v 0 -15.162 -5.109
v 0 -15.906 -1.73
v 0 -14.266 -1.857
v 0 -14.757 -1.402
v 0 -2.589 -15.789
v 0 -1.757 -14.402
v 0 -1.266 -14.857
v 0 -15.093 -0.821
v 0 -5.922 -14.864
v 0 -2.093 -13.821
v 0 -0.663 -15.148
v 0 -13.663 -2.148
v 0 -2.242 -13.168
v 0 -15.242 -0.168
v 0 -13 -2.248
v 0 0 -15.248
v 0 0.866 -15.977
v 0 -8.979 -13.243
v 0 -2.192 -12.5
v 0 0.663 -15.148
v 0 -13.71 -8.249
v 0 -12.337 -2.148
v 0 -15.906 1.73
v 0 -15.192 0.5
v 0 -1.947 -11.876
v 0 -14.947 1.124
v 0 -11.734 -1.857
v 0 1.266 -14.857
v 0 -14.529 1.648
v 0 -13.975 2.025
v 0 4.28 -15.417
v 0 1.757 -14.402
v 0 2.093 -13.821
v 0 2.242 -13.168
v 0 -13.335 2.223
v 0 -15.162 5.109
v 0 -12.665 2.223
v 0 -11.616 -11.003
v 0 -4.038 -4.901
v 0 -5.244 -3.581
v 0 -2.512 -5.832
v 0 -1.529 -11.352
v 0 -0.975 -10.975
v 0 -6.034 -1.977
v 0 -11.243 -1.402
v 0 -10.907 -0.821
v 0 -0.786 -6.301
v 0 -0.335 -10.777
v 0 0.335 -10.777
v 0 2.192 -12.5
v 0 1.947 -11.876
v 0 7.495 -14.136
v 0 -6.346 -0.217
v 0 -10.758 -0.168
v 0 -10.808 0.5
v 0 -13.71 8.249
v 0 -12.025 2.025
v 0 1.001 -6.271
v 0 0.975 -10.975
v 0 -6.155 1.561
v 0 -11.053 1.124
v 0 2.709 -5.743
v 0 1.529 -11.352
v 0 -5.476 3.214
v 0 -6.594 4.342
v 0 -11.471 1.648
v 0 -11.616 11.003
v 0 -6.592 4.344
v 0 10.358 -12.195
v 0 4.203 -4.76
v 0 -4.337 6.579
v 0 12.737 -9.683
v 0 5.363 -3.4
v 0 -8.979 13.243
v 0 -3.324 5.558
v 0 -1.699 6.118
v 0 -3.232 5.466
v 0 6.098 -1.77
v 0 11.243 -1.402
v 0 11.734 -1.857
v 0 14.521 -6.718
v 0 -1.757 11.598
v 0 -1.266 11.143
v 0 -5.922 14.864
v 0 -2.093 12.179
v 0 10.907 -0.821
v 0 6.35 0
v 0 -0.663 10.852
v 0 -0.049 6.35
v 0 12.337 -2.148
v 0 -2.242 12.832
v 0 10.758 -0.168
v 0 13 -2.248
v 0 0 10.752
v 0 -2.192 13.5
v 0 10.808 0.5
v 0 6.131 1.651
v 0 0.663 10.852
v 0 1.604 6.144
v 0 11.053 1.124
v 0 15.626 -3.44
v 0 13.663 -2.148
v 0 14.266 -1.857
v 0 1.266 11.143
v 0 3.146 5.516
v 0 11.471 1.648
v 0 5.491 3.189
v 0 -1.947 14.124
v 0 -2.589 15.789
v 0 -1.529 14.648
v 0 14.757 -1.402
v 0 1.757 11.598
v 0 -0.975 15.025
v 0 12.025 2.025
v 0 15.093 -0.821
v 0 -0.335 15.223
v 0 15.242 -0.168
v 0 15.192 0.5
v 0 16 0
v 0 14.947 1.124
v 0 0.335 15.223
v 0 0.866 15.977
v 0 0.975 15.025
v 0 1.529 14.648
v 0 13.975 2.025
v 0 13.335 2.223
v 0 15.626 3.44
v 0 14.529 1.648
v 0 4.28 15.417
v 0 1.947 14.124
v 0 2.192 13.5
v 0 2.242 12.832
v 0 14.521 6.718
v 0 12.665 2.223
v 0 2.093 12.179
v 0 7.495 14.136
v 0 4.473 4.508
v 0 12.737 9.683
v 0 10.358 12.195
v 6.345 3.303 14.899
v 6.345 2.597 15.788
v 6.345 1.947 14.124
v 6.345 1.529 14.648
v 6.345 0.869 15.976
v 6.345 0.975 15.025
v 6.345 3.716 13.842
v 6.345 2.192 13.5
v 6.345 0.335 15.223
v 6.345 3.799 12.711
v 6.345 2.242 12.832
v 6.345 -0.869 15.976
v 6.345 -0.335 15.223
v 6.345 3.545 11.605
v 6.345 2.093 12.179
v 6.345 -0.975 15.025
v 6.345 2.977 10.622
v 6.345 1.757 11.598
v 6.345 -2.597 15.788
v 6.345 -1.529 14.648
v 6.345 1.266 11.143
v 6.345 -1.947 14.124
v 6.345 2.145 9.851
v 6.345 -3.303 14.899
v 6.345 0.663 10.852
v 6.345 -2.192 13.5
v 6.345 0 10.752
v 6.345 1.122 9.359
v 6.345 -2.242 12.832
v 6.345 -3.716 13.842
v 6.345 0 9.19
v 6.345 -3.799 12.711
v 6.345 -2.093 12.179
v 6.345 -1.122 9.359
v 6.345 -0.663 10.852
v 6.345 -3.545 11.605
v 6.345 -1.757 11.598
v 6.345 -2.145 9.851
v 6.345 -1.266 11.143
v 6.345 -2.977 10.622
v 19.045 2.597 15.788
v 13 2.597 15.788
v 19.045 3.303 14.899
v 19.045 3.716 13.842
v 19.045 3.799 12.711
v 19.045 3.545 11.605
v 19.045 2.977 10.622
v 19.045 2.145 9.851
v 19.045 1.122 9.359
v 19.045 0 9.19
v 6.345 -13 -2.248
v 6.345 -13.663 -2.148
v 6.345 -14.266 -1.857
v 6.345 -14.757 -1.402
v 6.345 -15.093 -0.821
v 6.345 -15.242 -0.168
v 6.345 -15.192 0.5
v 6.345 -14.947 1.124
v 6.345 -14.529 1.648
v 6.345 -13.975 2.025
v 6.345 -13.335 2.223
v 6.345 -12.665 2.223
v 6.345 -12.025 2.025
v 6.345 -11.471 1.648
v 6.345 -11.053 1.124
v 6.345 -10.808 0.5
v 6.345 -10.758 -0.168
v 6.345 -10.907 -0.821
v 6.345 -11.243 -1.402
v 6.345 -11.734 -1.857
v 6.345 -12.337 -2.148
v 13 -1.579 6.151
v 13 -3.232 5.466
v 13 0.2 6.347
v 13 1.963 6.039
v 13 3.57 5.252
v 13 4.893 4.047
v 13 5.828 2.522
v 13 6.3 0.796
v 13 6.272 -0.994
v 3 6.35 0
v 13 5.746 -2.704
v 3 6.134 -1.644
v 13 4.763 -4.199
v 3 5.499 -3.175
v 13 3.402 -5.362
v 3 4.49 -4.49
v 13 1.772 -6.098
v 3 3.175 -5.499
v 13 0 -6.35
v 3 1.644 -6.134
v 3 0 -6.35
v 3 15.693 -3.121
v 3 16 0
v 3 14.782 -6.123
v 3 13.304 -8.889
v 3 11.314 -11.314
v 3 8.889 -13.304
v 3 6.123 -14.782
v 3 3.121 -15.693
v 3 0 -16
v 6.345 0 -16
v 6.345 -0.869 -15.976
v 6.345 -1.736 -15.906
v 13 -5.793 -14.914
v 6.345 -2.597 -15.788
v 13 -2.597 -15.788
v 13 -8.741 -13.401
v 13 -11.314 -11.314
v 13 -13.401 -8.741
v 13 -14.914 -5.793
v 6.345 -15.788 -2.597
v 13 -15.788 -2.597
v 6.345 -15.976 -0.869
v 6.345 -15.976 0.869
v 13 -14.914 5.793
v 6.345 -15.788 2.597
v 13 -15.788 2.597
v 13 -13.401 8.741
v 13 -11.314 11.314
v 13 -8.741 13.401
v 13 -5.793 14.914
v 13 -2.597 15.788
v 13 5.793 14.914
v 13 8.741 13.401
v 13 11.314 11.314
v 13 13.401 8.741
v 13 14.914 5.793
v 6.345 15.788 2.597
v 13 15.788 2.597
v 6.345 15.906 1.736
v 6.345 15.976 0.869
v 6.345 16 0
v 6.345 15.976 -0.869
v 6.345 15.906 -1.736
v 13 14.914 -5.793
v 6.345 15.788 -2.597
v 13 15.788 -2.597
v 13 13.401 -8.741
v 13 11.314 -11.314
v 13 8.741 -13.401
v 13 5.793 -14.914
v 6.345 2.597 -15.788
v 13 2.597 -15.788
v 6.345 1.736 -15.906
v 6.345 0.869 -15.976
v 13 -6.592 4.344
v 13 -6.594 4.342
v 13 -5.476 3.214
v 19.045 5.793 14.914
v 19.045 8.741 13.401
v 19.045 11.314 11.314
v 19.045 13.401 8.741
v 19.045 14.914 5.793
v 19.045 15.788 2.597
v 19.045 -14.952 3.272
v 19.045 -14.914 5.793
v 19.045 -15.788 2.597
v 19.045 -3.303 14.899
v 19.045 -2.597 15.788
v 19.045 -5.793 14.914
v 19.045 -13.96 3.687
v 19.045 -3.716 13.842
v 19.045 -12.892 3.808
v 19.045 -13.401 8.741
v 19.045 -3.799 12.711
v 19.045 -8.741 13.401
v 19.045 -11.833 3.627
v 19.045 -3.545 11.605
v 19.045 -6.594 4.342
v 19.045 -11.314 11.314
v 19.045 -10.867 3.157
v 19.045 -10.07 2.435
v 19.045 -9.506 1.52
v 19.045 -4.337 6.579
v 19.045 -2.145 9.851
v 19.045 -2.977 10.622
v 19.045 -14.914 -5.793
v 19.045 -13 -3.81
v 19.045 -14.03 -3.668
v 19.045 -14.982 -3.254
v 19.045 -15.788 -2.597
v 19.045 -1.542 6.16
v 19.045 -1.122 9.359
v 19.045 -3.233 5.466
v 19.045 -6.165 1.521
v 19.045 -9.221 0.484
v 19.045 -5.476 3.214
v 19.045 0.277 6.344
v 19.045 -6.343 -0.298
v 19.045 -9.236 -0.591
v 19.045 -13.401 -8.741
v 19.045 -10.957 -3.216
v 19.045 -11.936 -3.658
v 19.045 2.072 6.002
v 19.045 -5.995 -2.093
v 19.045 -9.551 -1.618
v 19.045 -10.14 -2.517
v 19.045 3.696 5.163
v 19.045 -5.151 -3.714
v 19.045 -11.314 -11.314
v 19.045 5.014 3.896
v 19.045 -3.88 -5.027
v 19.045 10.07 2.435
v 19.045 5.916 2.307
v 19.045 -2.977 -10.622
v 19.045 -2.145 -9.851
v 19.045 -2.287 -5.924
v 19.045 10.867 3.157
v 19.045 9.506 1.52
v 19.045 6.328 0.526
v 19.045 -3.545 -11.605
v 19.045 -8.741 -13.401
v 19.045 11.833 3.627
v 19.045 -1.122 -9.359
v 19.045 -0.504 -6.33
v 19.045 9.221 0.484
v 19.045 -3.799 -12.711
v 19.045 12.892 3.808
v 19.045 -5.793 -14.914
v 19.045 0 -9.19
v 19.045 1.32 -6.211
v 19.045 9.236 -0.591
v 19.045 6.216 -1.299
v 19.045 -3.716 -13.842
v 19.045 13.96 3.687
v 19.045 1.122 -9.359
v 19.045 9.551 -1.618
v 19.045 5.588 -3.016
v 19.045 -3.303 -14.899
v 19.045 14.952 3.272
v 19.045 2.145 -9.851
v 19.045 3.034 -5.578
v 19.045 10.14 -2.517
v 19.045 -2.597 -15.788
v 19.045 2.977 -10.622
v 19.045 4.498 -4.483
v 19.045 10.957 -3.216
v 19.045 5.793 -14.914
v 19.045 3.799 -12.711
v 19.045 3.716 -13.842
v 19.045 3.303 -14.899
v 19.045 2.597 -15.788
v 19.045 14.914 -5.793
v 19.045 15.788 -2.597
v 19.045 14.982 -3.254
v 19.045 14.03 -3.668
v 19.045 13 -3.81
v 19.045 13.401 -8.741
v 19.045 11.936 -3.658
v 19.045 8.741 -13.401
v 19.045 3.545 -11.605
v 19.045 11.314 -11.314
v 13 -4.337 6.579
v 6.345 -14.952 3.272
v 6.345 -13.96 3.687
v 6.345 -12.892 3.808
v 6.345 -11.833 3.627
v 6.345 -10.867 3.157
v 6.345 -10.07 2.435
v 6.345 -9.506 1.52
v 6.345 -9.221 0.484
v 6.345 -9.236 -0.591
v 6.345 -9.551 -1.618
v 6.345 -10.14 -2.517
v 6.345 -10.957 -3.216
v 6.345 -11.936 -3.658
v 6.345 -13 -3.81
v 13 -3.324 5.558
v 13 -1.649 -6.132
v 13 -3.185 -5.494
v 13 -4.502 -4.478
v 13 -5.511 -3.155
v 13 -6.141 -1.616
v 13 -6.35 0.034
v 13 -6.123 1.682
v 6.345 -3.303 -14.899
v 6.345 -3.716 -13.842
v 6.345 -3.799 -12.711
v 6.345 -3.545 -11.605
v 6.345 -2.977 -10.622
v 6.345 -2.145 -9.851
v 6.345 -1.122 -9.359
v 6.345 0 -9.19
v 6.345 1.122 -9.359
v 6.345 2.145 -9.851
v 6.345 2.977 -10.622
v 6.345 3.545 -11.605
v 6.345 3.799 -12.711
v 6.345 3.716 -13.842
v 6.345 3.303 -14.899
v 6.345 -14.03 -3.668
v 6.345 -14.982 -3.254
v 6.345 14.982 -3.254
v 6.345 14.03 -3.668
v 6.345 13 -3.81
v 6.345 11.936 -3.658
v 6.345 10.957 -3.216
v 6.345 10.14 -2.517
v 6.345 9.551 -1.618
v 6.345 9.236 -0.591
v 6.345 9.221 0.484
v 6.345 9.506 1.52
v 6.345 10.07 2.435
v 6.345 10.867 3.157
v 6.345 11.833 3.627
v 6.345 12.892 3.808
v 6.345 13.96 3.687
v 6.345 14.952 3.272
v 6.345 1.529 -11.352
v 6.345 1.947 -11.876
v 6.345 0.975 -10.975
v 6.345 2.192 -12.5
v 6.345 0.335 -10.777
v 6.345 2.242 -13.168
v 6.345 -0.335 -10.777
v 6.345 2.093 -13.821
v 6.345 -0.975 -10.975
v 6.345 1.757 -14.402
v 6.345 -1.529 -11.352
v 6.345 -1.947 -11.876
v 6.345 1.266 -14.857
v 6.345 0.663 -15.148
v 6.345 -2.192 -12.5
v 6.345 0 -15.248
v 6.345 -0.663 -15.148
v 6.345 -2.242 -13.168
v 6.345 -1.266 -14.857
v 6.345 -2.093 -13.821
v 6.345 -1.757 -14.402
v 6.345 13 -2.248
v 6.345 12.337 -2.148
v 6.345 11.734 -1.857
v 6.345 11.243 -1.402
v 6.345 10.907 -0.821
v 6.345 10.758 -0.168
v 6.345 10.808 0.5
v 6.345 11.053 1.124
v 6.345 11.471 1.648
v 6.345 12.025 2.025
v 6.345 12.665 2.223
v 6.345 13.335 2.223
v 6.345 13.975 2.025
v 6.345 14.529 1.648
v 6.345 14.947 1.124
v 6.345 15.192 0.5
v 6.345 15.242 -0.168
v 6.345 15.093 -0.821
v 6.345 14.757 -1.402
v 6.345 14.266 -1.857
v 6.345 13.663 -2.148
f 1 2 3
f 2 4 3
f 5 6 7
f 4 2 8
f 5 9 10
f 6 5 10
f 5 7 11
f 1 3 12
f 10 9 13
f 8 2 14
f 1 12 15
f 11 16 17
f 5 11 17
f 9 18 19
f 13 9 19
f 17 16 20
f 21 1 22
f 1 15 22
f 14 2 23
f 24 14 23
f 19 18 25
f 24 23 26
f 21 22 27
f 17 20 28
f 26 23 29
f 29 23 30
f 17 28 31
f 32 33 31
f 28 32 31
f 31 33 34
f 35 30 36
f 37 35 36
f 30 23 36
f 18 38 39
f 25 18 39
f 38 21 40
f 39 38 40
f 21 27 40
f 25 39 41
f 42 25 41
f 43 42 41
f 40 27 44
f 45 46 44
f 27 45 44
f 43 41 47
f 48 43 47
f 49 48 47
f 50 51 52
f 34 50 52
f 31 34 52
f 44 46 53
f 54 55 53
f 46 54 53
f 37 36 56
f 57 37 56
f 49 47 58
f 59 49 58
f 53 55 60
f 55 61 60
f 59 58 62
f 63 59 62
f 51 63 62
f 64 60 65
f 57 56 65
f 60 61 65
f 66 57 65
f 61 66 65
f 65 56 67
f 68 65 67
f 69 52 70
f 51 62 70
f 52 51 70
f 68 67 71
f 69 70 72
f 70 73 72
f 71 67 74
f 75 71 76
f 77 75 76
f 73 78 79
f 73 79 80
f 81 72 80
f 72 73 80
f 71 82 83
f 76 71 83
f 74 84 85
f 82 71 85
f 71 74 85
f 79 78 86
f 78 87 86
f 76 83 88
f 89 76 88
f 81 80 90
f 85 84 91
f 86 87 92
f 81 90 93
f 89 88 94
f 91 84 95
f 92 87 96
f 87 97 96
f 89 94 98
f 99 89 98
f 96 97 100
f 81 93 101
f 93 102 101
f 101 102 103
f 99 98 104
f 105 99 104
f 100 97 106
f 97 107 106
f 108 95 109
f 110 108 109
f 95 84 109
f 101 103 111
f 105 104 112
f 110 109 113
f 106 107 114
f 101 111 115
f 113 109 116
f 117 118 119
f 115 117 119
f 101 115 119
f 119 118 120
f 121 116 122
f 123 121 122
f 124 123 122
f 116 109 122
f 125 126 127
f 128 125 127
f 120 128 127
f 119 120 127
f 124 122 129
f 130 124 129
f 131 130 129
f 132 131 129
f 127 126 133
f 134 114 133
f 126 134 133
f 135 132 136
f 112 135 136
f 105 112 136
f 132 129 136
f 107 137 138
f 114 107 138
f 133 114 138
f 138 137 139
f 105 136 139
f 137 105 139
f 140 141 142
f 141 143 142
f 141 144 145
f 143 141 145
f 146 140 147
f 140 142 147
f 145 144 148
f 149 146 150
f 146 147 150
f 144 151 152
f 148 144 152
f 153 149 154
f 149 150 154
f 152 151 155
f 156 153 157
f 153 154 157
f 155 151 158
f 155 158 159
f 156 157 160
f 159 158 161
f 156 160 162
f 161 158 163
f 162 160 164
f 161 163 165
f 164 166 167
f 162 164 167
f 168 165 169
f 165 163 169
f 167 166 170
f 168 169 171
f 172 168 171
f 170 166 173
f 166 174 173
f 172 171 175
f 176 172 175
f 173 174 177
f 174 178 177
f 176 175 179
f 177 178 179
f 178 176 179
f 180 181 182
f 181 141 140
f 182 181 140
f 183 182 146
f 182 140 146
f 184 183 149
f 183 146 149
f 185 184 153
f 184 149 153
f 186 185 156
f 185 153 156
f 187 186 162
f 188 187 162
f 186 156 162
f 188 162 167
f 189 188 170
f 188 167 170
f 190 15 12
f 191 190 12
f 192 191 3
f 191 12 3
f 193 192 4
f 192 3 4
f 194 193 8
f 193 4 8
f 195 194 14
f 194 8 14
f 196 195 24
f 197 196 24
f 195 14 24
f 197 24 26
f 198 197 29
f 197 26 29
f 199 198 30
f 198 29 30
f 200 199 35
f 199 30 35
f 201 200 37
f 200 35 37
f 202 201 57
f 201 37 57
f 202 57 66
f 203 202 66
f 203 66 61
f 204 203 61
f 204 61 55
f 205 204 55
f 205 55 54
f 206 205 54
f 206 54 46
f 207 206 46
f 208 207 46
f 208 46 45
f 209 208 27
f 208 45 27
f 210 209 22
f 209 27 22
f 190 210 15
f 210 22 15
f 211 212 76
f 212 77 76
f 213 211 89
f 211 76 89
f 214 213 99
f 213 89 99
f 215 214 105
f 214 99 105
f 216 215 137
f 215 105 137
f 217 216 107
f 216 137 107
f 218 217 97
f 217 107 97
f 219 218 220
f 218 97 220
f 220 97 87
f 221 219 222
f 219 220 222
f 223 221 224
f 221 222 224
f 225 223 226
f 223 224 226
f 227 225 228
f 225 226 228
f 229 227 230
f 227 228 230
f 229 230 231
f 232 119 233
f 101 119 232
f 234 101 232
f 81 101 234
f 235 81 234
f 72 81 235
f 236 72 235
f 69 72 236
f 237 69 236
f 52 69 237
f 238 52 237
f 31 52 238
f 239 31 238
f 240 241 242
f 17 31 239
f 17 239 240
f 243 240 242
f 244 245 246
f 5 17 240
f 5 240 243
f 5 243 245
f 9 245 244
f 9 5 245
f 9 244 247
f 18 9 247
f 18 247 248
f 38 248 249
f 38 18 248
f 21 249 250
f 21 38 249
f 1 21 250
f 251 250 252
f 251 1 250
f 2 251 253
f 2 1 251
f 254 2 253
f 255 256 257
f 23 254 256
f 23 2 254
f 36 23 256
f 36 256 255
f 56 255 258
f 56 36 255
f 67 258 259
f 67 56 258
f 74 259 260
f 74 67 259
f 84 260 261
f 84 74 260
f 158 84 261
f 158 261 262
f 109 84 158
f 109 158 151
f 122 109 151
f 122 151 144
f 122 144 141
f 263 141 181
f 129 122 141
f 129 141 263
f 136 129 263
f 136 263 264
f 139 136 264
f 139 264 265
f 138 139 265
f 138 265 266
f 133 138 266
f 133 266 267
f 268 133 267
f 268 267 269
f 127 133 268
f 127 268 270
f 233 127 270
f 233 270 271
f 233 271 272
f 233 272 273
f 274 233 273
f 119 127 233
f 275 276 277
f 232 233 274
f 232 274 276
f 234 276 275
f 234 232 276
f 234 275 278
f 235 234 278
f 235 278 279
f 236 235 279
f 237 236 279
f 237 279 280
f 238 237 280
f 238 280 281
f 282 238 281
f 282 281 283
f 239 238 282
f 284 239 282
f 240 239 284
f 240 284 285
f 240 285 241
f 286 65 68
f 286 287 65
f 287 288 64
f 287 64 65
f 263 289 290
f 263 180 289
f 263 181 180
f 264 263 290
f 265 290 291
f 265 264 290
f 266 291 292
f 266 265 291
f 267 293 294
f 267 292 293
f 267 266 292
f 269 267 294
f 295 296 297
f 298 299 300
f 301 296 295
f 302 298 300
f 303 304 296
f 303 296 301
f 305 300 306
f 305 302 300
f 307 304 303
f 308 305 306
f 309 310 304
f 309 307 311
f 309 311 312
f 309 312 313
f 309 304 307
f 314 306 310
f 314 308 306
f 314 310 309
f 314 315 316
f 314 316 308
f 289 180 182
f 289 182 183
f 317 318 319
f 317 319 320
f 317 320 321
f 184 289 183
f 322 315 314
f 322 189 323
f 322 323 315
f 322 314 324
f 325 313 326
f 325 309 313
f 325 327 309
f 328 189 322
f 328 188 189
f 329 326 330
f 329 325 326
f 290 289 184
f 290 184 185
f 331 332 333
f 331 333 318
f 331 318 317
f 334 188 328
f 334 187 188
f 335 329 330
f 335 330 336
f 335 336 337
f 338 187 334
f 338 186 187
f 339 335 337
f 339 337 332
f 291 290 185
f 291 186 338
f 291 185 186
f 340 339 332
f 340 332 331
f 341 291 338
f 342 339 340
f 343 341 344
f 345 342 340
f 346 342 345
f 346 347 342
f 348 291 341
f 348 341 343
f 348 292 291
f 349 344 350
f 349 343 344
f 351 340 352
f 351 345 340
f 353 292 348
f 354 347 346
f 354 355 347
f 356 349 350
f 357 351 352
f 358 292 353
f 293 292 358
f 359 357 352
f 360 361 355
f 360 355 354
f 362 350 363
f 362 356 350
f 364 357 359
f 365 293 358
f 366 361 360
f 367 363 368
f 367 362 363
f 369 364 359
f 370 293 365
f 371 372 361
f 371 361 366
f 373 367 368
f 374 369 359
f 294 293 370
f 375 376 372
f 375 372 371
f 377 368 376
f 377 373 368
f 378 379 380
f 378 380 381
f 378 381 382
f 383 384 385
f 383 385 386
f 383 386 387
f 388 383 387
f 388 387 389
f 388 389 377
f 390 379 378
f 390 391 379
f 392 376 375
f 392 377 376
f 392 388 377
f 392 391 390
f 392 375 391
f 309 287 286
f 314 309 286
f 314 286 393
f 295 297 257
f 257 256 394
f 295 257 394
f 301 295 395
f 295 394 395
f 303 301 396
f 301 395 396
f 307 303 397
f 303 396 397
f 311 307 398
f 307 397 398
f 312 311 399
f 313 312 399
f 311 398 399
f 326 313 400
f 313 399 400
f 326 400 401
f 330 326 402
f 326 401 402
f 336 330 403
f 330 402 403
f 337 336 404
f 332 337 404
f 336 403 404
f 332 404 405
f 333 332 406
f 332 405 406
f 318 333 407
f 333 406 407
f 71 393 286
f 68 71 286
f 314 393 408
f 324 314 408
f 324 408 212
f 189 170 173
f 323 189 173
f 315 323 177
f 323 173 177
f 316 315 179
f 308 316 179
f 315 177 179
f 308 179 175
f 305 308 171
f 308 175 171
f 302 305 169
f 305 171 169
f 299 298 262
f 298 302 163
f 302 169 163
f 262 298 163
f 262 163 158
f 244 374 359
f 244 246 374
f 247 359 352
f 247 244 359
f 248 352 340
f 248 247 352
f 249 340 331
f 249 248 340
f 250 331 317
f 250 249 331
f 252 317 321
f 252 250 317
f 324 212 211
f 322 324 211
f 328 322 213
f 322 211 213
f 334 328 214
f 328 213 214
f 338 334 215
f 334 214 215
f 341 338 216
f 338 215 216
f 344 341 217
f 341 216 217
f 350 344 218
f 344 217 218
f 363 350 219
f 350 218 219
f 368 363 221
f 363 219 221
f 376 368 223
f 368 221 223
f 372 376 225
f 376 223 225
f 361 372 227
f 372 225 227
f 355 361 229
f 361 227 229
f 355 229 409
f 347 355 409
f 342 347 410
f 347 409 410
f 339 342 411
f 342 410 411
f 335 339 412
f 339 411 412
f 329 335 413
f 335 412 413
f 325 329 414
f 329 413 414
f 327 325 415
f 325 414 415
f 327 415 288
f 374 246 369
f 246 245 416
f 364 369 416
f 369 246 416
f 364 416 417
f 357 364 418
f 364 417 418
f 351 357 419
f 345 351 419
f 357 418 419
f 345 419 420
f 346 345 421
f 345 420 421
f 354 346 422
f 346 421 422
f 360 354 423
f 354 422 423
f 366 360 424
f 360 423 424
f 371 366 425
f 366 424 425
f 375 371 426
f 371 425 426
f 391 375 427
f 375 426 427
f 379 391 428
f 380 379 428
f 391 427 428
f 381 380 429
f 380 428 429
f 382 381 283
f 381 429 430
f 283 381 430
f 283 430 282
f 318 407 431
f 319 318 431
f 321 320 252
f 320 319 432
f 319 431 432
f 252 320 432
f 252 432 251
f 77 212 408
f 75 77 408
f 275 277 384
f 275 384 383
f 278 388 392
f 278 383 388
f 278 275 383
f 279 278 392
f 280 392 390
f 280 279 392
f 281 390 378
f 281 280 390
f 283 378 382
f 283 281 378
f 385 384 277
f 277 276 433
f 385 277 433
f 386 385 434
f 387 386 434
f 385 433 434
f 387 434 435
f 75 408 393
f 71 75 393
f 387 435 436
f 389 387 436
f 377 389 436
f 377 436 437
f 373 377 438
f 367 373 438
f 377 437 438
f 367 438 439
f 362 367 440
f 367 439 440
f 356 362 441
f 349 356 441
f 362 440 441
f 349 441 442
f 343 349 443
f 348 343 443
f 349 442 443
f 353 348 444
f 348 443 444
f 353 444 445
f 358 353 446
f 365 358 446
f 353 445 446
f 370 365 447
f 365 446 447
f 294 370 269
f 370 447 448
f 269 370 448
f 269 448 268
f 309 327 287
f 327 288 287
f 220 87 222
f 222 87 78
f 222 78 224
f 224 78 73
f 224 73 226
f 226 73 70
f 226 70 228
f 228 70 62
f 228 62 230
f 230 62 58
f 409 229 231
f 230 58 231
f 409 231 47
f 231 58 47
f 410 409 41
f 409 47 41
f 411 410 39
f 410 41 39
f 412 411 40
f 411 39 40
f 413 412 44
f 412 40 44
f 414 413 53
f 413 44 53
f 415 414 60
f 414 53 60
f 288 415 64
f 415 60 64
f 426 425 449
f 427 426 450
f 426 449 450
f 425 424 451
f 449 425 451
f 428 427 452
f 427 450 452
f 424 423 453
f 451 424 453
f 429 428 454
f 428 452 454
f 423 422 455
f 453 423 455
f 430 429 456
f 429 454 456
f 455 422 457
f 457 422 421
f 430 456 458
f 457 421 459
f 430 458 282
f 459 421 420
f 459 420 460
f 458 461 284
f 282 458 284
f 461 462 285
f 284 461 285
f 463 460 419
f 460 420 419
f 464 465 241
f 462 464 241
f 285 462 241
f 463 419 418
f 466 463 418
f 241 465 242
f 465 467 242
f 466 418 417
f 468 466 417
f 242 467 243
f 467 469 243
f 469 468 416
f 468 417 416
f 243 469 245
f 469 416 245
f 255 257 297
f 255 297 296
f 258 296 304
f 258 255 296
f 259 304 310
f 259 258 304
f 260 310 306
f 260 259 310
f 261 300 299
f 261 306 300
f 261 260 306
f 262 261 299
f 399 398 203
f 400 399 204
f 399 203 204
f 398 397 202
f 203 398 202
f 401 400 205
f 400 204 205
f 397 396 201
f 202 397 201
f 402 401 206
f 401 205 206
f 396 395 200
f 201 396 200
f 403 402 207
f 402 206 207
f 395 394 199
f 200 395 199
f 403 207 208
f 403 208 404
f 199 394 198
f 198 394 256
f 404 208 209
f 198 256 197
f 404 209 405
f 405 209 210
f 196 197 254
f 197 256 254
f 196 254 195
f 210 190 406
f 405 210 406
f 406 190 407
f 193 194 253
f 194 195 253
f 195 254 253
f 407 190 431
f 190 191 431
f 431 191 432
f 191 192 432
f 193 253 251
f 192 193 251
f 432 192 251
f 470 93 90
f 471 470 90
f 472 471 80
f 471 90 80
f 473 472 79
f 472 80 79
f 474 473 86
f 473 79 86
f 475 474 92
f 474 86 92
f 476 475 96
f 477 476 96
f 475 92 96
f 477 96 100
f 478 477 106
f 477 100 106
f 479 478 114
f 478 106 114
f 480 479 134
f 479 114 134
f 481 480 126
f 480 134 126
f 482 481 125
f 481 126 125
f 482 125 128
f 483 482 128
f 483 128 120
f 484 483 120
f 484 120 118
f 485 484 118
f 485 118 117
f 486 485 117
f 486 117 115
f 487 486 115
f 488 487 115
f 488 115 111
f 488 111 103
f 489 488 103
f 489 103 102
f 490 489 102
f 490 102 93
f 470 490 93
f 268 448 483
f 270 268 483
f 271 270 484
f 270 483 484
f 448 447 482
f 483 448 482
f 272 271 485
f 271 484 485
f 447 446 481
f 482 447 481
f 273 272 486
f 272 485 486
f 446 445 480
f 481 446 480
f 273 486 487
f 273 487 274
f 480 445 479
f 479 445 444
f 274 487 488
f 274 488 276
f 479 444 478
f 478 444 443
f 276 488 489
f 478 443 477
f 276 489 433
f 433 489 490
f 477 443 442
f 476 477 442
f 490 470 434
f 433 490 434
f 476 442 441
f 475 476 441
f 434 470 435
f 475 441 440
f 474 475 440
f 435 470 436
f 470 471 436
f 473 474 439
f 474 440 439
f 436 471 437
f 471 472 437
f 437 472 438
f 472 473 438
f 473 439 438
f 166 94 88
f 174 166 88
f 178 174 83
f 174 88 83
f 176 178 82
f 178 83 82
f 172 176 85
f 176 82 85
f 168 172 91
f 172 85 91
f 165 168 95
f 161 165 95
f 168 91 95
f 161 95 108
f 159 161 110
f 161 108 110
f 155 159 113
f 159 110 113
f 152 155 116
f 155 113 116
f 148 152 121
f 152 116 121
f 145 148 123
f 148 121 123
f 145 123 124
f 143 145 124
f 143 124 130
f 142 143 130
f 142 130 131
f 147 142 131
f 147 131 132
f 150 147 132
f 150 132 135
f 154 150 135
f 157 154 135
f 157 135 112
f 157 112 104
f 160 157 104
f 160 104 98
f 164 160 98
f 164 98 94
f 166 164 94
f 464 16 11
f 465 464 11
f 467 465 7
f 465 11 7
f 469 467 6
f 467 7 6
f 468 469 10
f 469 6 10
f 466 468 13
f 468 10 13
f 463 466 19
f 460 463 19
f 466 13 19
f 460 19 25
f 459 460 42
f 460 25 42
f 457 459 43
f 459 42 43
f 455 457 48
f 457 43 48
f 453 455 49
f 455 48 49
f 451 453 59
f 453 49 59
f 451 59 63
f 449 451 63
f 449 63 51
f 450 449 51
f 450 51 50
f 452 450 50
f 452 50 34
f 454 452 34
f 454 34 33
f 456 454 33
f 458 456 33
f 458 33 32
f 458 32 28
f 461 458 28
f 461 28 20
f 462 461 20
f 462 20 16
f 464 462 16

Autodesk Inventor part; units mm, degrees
ref_plane "YZ Plane" through (0, 0, 0) normal (1, 0, 0) x (0, 1, 0)
sketch "Sketch1" plane through (0, 0, 0) normal (1, 0, 0) x (0, 1, 0)
  circle A0 centre (0, 0) radius 16
  circle A1 centre (0, 13) radius 2
  circle A2 centre (0, -13) radius 2
  circle A3 centre (-13, 0) radius 2
  circle A4 centre (13, 0) radius 2
  circle A5 centre (0, -13) radius 2
  circle A6 centre (0, 13) radius 2
  circle A7 centre (13, 0) radius 2
  circle A8 centre (-13, 0) radius 2
  circle A9 centre (0, 0) radius 6.35
  line L0 (0, -22.4) -> (0, 22.4) projected
  dimension "d0" = 32
  dimension "d1" = 4
  dimension "d2" = 26
  dimension "d3" = 13
  dimension "d6" = 360
  dimension "d8" = 12.7
extrude "Extrusion1" add sketch "Sketch1" along normal blind 3 contours A0 L0 A2 A9 A1 | L0 A1 A9 A2 A0
sketch "Sketch2" plane through (3, 0, 0) normal (1, 0, 0) x (0, 0, -1)
  circle A0 centre (0, 0) radius 16 projected
  circle A1 centre (13, 0) radius 2 projected
  circle A2 centre (0, 0) radius 6.35 projected
  circle A3 centre (0, -13) radius 2 projected
  circle A4 centre (-13, 0) radius 2 projected
  circle A5 centre (0, 13) radius 2 projected
  circle A6 centre (0, 0) radius 7.5
  dimension "d11" = 15
extrude "Extrusion2" add sketch "Sketch2" along normal blind 10 contours A6
ref_plane "Work Plane1" through (0, 0, 0) normal (0, 0.7071068, -0.7071068) x (-1, 0, 0)
sketch "Sketch6" plane through (3, 0, 0) normal (1, 0, 0) x (0, 0, -1)
  circle A0 centre (0, 0) radius 7.5565
  circle A1 centre (0, 0) radius 6.35 projected
  circle A2 centre (0, 0) radius 7.5 projected
  circle A3 centre (0, 0) radius 6.35 projected
  dimension "d18" = 15.113
sketch "Sketch6 outline for Extrusion4" plane through (3, 0, 0) normal (1, 0, 0) x (0, 0, -1)
  circle A0 centre (0, 0) radius 7.5565
  circle A1 centre (0, 0) radius 7.5
extrude "Extrusion4" add sketch "Sketch6 outline for Extrusion4" along normal up to surface (10 mm away)
sketch "Sketch7" plane through (3, 0, 0) normal (1, 0, 0) x (0, 0, -1)
  circle A0 centre (-13, 0) radius 2
  circle A1 centre (-13, 0) radius 3
  circle A2 centre (0, 13) radius 2
  circle A3 centre (0, 13) radius 3
  circle A4 centre (13, 0) radius 2
  circle A5 centre (13, 0) radius 2.999819
  circle A6 centre (0, -13) radius 2
  circle A7 centre (0, -13) radius 3
  circle A8 centre (0, 0) radius 7.5565
  circle A9 centre (0, 0) radius 16
  circle A10 centre (0, 13) radius 3.81
  circle A11 centre (-13, 0) radius 3.81
  circle A12 centre (0, -13) radius 3.81
  circle A13 centre (13, 0) radius 3.81
  line L0 (-13, 3.81) -> (-15.539752, 3.81)
  line L1 (-13, -3.81) -> (-15.539752, -3.81)
  line L2 (-3.81, -13) -> (-3.81, -15.539752)
  line L3 (3.81, -13) -> (3.81, -15.539752)
  line L4 (13, -3.81) -> (15.539752, -3.81)
  line L5 (13, 3.81) -> (15.539752, 3.81)
  line L6 (-3.81, 13) -> (-3.81, 15.539752)
  line L7 (3.81, 13) -> (3.81, 15.539752)
  point P0 (15.787842, -2.596928)
  point P1 (15.787842, 2.596928)
  point P2 (2.596928, 15.787842)
  point P3 (-2.596928, 15.787842)
  point P4 (-15.787842, 2.596928)
  point P5 (-15.787842, -2.596928)
  point P6 (-2.596928, -15.787842)
  point P7 (2.596928, -15.787842)
  dimension "d21" = 7.62
  dimension "d22" = 7.62
  dimension "d23" = 7.62
  dimension "d24" = 7.62
extrude "Extrusion5" add sketch "Sketch7" along normal up to surface (10 mm away) contours A1 | A9 A11 | A9 L0 A11 | A11 L1 A9 | A9 L6 A10 L7 L5 A13 L4 L3 A12 L2 L1 A11 L0 | A9 A10 L6 | L2 A12 A9 | A3 | A9 A10 | A7 | A12 A9 | A9 L7 A10 | A12 L3 A9 | A9 A13 L5 | L4 A13 A9 | A5 | A9 A13 picked at (-9.491842, -0.282602) picked at (3.503096, 12.696069) picked at (3.503096, -12.696069) picked at (12.57554, -3.495745)
sketch "Sketch8" plane through (13, 0, 0) normal (1, 0, 0) x (0, 0, -1)
  circle A0 centre (0, -13) radius 2
  circle A1 centre (-13, 0) radius 2
  line L0 (-4.495748, -4.495171) -> (-3.429275, -5.671093)
  line L1 (-4.495748, -4.495171) -> (-5.56222, -3.319249)
  circle A2 centre (0, 0) radius 6.35
  line L2 (-5.56222, -3.319249) -> (-5.465977, -3.231964)
  line L3 (-3.429275, -5.671093) -> (-3.214472, -5.476283)
  line L4 (-3.214472, -5.476283) -> (-5.45172, -3.219033)
  line L5 (-5.45172, -3.219033) -> (-6.579236, -4.336559)
  line L6 (-3.214472, -5.476283) -> (-4.341988, -6.593808)
  line L7 (-6.579236, -4.336559) -> (-4.344185, -6.591592)
  line L8 (-4.341988, -6.593808) -> (-4.344185, -6.591592)
  dimension "d27" = 1.5875
  dimension "d28" = 1.5875
  dimension "d29" = 1.5875
  dimension "d30" = 1.5875
  dimension "d31" = 90
  dimension "d32" = 0
  dimension "d33" = 90
  dimension "d34" = 3.175
  dimension "d35" = 90
extrude "Extrusion6" cut sketch "Sketch8" against normal up to surface (13 mm away) contours L1 A2 L3 L0 | L0 L3 L6 L8 L7 L5 L1 | L1 L5 A2 | A2 L5 L4 picked at (-4.633855, -4.096279)
sketch "Sketch9" plane through (13, 0, 0) normal (1, 0, 0) x (0, 0, -1)
  line L0 (-3.214472, -5.476283) -> (-4.341988, -6.593808)
  line L1 (-4.341988, -6.593808) -> (-6.579236, -4.336559)
  line L2 (-6.579236, -4.336559) -> (-5.46553, -3.232721)
  arc A0 (-3.214472, -5.476283) -> (-5.46553, -3.232721) centre (0, 0) ccw
  circle A1 centre (0, 13) radius 2
  circle A2 centre (-13, 0) radius 2
  circle A3 centre (0, -13) radius 2
  circle A4 centre (13, 0) radius 2
  circle A5 centre (0, 0) radius 16
extrude "Extrusion7" add sketch "Sketch9" along normal blind 6.0452
sketch "Sketch10" plane through (19.0452, 0, 0) normal (1, 0, 0) x (0, 0, -1)
  circle A0 centre (13, 0) radius 2 projected
  point P0 (0, 0)
hole "Hole1" at (19.0452, 0, -13) direction (-1, 0, 0) diameter 4.4958 end through all counterbore diameter 7.62 counterbore depth 12.7 clearance for "Hex Machine Screw" size "#8" standard "Ansi Unified Screw Threads"
sketch "Sketch11" plane through (19.0452, 0, 0) normal (1, 0, 0) x (0, 0, -1)
  circle A0 centre (0, 13) radius 2 projected
  point P0 (0, 0)
  point P1 (0, 13)
hole "Hole2" at (19.0452, 13, 0) direction (-1, 0, 0) diameter 4.4958 end through all counterbore diameter 7.62 counterbore depth 12.7 clearance for "Hex Machine Screw" size "#8" standard "Ansi Unified Screw Threads"
sketch "Sketch12" plane through (19.0452, 0, 0) normal (1, 0, 0) x (0, 0, -1)
  circle A0 centre (-13, 0) radius 2 projected
  point P0 (0, 0)
hole "Hole3" at (19.0452, 0, 13) direction (-1, 0, 0) diameter 4.4958 end through all counterbore diameter 7.62 counterbore depth 12.7 clearance for "Hex Machine Screw" size "#8" standard "Ansi Unified Screw Threads"
sketch "Sketch13" plane through (19.0452, 0, 0) normal (1, 0, 0) x (0, 0, -1)
  circle A0 centre (0, -13) radius 2 projected
  point P0 (0, 0)
  point P1 (0, -13)
hole "Hole4" at (19.0452, -13, 0) direction (-1, 0, 0) diameter 4.4958 end through all counterbore diameter 7.62 counterbore depth 12.7 clearance for "Hex Machine Screw" size "#8" standard "Ansi Unified Screw Threads"
properties part number "HipCoupler V2" material "Steel, Mild"
